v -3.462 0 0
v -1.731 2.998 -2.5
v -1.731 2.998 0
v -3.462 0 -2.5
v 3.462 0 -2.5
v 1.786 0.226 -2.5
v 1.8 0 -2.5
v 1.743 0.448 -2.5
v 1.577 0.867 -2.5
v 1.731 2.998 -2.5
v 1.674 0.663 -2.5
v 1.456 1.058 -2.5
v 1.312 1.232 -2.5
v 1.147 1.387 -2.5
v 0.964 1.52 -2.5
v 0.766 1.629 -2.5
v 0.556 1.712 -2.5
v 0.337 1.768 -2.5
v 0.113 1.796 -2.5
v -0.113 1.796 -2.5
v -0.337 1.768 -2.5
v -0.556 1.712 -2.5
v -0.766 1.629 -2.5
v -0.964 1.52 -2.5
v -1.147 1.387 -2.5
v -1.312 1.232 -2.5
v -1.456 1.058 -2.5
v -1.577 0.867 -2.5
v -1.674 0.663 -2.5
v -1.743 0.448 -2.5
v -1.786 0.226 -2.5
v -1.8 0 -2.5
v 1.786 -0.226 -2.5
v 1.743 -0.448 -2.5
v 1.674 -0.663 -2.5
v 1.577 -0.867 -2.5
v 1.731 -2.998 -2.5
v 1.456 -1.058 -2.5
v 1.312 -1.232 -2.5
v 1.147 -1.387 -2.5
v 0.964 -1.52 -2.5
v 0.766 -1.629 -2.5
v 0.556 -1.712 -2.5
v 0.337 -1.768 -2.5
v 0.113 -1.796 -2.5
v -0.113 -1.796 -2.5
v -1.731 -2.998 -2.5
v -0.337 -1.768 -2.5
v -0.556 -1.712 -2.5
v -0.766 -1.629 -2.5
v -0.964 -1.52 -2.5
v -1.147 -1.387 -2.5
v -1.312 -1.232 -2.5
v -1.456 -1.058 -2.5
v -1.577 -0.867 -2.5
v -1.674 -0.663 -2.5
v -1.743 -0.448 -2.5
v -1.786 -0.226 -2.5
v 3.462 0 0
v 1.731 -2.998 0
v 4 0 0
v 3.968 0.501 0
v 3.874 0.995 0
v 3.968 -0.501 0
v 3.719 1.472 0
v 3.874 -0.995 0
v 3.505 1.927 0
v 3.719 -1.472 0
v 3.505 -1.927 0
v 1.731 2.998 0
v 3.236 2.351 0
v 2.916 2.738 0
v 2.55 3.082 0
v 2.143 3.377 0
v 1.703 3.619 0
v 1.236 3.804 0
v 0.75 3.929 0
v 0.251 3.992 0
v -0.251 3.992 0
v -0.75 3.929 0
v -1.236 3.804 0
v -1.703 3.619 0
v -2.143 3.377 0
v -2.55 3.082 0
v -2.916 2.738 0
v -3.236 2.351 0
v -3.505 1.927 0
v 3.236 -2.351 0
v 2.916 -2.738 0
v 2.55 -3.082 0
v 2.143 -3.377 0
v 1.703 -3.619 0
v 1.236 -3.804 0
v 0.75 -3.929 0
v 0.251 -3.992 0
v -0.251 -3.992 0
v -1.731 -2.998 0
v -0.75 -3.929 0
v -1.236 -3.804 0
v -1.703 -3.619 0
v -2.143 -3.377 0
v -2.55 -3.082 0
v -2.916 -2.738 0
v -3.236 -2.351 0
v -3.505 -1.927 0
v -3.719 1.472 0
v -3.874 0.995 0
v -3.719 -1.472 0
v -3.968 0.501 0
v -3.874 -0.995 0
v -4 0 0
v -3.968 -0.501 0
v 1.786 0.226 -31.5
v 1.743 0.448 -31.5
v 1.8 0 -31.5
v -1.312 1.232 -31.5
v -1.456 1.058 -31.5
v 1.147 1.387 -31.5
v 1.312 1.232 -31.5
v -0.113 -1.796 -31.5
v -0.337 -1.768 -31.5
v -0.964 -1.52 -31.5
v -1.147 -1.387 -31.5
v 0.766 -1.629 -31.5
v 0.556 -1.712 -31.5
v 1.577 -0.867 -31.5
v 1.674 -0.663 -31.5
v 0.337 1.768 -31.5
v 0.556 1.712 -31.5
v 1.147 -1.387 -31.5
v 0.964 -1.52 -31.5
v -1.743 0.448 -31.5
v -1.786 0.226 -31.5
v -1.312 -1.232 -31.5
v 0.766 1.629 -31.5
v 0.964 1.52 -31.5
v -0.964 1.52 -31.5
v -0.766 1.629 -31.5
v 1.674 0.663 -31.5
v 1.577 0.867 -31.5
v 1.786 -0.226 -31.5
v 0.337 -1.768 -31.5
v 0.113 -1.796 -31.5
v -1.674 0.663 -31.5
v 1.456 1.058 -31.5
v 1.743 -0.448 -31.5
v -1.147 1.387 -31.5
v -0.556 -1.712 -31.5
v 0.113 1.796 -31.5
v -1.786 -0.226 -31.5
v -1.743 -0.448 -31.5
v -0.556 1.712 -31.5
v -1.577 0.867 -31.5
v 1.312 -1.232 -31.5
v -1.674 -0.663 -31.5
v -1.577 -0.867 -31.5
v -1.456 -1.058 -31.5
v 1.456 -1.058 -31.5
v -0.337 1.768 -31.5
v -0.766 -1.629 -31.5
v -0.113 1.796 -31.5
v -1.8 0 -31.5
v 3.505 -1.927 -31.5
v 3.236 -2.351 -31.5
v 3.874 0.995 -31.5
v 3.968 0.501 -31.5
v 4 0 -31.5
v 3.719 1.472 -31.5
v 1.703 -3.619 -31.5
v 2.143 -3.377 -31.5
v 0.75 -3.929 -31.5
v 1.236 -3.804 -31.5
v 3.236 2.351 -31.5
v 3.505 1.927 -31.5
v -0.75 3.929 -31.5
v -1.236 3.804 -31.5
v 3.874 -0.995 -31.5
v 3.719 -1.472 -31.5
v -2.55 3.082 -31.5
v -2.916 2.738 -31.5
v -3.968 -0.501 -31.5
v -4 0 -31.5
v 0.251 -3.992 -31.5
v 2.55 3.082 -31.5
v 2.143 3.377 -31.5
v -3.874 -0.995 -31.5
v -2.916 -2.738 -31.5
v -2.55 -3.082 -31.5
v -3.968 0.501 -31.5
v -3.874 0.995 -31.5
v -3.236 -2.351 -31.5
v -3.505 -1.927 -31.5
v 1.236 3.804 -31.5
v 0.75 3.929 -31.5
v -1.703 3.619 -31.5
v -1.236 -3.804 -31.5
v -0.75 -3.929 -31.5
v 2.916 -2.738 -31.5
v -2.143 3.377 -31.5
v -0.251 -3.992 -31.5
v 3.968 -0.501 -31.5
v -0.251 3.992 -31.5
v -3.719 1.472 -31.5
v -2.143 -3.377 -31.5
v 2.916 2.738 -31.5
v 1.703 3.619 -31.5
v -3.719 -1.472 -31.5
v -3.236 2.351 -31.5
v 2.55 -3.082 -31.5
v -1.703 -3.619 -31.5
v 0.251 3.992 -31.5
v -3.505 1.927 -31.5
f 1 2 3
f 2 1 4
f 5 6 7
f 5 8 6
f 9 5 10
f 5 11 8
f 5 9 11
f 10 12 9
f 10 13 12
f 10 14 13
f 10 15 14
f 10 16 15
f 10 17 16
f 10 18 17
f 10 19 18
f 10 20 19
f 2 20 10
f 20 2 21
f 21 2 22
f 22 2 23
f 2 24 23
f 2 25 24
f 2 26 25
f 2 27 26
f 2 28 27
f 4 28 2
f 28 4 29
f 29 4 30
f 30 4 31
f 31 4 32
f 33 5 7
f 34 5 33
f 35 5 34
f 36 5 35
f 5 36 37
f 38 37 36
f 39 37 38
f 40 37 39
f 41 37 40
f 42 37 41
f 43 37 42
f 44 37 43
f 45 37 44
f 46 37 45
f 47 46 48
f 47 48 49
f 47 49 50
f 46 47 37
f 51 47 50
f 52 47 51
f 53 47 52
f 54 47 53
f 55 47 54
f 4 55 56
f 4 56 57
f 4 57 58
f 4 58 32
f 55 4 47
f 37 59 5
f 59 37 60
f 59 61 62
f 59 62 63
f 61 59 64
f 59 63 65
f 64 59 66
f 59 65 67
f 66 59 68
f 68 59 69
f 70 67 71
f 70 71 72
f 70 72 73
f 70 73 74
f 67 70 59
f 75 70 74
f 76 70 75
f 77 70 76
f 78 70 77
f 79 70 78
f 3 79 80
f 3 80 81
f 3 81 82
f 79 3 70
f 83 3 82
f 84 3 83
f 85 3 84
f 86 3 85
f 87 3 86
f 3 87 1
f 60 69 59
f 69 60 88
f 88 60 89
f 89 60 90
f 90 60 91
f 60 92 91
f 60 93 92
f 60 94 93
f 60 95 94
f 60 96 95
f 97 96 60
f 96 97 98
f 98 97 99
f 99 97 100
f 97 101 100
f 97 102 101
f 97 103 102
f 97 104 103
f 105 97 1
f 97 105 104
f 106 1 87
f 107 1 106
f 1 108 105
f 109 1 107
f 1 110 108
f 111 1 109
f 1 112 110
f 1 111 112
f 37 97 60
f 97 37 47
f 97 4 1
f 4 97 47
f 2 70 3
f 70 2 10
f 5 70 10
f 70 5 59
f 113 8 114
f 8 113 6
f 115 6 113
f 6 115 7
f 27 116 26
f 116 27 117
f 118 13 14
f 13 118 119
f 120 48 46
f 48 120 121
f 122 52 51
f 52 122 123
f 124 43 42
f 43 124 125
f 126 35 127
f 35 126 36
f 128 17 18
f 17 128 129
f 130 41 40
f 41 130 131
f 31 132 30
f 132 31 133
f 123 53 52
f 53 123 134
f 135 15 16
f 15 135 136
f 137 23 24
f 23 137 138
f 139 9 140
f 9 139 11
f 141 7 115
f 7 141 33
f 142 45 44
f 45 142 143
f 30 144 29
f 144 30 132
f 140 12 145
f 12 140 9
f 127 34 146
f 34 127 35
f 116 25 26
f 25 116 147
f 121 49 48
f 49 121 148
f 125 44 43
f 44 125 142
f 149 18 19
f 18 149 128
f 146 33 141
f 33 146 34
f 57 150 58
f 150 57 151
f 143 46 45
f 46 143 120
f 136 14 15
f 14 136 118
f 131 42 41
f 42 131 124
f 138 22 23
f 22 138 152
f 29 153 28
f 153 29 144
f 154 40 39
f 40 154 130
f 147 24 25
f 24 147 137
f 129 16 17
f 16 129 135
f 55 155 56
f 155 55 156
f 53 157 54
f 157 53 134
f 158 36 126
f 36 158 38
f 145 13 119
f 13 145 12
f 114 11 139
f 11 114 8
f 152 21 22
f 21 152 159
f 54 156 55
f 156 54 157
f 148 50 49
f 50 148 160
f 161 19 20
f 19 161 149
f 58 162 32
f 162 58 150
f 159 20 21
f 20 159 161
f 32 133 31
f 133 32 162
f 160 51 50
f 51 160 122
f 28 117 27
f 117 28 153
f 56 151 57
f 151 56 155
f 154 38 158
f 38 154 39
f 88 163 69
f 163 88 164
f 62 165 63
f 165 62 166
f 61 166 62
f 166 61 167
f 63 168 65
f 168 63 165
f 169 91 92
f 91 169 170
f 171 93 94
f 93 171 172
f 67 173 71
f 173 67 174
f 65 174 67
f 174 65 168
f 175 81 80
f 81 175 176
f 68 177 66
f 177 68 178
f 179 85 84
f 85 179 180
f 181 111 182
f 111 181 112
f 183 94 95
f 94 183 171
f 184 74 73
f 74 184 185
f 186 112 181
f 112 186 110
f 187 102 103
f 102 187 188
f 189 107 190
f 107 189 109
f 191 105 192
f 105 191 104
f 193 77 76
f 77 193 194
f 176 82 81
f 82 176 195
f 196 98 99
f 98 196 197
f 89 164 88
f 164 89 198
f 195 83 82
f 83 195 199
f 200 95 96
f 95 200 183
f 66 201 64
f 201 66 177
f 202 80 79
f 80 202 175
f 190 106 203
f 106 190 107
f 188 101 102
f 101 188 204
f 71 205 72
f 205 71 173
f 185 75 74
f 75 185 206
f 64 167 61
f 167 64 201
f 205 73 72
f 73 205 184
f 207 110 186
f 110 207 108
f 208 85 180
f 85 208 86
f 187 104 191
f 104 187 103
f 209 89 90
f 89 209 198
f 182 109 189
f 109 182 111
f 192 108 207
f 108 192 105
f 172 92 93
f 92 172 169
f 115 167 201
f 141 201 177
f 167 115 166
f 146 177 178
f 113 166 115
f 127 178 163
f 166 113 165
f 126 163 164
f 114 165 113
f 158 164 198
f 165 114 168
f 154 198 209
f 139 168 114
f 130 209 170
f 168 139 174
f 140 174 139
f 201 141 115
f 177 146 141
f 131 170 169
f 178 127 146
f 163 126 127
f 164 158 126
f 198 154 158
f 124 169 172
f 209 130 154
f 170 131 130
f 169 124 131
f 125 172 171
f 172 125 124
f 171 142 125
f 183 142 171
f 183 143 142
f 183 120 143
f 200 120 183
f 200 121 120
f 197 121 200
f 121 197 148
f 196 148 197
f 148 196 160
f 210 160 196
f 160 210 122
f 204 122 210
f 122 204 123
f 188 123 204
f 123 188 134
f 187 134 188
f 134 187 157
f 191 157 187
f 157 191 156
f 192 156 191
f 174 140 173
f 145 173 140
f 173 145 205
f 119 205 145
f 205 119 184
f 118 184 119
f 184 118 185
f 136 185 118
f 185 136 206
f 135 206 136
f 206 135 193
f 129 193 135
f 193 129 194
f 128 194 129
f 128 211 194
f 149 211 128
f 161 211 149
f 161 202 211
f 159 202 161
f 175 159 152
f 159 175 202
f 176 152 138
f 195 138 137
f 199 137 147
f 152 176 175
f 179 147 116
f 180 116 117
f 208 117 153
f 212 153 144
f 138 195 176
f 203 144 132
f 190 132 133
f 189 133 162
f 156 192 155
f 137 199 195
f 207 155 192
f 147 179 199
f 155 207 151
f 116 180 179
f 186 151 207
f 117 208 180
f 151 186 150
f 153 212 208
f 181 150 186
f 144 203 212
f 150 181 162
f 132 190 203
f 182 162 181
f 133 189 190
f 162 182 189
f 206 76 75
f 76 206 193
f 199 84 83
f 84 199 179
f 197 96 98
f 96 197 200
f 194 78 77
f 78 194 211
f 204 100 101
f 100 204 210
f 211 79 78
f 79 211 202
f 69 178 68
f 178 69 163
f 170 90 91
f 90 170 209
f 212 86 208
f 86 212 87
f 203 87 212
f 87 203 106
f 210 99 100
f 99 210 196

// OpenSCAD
$fn = 50;

difference() {
	union() {
		translate(v = [0, 0, -31.5]) {
			cylinder(h = 34.5, r = 4.0);
		}
	}
	union() {
		translate(v = [0, 0, 0]) {
			rotate(a = [0, 0, 0]) {
				difference() {
					union() {
						translate(v = [0, 0, -2.5]) {
							linear_extrude(height = 2.5) {
								polygon(points = [[3.4619999999999997, 0.0], [1.7310000000000003, 2.9981799479017264], [-1.7309999999999992, 2.9981799479017264], [-3.4619999999999997, 4.2397272186481365e-16], [-1.7310000000000014, -2.998179947901726], [1.7309999999999977, -2.9981799479017277]]);
							}
						}
					}
					union();
				}
			}
		}
		#cylinder(h = 3, r = 5.0);
		#translate(v = [0, 0, -100.0]) {
			cylinder(h = 200, r = 1.8);
		}
	}
}
